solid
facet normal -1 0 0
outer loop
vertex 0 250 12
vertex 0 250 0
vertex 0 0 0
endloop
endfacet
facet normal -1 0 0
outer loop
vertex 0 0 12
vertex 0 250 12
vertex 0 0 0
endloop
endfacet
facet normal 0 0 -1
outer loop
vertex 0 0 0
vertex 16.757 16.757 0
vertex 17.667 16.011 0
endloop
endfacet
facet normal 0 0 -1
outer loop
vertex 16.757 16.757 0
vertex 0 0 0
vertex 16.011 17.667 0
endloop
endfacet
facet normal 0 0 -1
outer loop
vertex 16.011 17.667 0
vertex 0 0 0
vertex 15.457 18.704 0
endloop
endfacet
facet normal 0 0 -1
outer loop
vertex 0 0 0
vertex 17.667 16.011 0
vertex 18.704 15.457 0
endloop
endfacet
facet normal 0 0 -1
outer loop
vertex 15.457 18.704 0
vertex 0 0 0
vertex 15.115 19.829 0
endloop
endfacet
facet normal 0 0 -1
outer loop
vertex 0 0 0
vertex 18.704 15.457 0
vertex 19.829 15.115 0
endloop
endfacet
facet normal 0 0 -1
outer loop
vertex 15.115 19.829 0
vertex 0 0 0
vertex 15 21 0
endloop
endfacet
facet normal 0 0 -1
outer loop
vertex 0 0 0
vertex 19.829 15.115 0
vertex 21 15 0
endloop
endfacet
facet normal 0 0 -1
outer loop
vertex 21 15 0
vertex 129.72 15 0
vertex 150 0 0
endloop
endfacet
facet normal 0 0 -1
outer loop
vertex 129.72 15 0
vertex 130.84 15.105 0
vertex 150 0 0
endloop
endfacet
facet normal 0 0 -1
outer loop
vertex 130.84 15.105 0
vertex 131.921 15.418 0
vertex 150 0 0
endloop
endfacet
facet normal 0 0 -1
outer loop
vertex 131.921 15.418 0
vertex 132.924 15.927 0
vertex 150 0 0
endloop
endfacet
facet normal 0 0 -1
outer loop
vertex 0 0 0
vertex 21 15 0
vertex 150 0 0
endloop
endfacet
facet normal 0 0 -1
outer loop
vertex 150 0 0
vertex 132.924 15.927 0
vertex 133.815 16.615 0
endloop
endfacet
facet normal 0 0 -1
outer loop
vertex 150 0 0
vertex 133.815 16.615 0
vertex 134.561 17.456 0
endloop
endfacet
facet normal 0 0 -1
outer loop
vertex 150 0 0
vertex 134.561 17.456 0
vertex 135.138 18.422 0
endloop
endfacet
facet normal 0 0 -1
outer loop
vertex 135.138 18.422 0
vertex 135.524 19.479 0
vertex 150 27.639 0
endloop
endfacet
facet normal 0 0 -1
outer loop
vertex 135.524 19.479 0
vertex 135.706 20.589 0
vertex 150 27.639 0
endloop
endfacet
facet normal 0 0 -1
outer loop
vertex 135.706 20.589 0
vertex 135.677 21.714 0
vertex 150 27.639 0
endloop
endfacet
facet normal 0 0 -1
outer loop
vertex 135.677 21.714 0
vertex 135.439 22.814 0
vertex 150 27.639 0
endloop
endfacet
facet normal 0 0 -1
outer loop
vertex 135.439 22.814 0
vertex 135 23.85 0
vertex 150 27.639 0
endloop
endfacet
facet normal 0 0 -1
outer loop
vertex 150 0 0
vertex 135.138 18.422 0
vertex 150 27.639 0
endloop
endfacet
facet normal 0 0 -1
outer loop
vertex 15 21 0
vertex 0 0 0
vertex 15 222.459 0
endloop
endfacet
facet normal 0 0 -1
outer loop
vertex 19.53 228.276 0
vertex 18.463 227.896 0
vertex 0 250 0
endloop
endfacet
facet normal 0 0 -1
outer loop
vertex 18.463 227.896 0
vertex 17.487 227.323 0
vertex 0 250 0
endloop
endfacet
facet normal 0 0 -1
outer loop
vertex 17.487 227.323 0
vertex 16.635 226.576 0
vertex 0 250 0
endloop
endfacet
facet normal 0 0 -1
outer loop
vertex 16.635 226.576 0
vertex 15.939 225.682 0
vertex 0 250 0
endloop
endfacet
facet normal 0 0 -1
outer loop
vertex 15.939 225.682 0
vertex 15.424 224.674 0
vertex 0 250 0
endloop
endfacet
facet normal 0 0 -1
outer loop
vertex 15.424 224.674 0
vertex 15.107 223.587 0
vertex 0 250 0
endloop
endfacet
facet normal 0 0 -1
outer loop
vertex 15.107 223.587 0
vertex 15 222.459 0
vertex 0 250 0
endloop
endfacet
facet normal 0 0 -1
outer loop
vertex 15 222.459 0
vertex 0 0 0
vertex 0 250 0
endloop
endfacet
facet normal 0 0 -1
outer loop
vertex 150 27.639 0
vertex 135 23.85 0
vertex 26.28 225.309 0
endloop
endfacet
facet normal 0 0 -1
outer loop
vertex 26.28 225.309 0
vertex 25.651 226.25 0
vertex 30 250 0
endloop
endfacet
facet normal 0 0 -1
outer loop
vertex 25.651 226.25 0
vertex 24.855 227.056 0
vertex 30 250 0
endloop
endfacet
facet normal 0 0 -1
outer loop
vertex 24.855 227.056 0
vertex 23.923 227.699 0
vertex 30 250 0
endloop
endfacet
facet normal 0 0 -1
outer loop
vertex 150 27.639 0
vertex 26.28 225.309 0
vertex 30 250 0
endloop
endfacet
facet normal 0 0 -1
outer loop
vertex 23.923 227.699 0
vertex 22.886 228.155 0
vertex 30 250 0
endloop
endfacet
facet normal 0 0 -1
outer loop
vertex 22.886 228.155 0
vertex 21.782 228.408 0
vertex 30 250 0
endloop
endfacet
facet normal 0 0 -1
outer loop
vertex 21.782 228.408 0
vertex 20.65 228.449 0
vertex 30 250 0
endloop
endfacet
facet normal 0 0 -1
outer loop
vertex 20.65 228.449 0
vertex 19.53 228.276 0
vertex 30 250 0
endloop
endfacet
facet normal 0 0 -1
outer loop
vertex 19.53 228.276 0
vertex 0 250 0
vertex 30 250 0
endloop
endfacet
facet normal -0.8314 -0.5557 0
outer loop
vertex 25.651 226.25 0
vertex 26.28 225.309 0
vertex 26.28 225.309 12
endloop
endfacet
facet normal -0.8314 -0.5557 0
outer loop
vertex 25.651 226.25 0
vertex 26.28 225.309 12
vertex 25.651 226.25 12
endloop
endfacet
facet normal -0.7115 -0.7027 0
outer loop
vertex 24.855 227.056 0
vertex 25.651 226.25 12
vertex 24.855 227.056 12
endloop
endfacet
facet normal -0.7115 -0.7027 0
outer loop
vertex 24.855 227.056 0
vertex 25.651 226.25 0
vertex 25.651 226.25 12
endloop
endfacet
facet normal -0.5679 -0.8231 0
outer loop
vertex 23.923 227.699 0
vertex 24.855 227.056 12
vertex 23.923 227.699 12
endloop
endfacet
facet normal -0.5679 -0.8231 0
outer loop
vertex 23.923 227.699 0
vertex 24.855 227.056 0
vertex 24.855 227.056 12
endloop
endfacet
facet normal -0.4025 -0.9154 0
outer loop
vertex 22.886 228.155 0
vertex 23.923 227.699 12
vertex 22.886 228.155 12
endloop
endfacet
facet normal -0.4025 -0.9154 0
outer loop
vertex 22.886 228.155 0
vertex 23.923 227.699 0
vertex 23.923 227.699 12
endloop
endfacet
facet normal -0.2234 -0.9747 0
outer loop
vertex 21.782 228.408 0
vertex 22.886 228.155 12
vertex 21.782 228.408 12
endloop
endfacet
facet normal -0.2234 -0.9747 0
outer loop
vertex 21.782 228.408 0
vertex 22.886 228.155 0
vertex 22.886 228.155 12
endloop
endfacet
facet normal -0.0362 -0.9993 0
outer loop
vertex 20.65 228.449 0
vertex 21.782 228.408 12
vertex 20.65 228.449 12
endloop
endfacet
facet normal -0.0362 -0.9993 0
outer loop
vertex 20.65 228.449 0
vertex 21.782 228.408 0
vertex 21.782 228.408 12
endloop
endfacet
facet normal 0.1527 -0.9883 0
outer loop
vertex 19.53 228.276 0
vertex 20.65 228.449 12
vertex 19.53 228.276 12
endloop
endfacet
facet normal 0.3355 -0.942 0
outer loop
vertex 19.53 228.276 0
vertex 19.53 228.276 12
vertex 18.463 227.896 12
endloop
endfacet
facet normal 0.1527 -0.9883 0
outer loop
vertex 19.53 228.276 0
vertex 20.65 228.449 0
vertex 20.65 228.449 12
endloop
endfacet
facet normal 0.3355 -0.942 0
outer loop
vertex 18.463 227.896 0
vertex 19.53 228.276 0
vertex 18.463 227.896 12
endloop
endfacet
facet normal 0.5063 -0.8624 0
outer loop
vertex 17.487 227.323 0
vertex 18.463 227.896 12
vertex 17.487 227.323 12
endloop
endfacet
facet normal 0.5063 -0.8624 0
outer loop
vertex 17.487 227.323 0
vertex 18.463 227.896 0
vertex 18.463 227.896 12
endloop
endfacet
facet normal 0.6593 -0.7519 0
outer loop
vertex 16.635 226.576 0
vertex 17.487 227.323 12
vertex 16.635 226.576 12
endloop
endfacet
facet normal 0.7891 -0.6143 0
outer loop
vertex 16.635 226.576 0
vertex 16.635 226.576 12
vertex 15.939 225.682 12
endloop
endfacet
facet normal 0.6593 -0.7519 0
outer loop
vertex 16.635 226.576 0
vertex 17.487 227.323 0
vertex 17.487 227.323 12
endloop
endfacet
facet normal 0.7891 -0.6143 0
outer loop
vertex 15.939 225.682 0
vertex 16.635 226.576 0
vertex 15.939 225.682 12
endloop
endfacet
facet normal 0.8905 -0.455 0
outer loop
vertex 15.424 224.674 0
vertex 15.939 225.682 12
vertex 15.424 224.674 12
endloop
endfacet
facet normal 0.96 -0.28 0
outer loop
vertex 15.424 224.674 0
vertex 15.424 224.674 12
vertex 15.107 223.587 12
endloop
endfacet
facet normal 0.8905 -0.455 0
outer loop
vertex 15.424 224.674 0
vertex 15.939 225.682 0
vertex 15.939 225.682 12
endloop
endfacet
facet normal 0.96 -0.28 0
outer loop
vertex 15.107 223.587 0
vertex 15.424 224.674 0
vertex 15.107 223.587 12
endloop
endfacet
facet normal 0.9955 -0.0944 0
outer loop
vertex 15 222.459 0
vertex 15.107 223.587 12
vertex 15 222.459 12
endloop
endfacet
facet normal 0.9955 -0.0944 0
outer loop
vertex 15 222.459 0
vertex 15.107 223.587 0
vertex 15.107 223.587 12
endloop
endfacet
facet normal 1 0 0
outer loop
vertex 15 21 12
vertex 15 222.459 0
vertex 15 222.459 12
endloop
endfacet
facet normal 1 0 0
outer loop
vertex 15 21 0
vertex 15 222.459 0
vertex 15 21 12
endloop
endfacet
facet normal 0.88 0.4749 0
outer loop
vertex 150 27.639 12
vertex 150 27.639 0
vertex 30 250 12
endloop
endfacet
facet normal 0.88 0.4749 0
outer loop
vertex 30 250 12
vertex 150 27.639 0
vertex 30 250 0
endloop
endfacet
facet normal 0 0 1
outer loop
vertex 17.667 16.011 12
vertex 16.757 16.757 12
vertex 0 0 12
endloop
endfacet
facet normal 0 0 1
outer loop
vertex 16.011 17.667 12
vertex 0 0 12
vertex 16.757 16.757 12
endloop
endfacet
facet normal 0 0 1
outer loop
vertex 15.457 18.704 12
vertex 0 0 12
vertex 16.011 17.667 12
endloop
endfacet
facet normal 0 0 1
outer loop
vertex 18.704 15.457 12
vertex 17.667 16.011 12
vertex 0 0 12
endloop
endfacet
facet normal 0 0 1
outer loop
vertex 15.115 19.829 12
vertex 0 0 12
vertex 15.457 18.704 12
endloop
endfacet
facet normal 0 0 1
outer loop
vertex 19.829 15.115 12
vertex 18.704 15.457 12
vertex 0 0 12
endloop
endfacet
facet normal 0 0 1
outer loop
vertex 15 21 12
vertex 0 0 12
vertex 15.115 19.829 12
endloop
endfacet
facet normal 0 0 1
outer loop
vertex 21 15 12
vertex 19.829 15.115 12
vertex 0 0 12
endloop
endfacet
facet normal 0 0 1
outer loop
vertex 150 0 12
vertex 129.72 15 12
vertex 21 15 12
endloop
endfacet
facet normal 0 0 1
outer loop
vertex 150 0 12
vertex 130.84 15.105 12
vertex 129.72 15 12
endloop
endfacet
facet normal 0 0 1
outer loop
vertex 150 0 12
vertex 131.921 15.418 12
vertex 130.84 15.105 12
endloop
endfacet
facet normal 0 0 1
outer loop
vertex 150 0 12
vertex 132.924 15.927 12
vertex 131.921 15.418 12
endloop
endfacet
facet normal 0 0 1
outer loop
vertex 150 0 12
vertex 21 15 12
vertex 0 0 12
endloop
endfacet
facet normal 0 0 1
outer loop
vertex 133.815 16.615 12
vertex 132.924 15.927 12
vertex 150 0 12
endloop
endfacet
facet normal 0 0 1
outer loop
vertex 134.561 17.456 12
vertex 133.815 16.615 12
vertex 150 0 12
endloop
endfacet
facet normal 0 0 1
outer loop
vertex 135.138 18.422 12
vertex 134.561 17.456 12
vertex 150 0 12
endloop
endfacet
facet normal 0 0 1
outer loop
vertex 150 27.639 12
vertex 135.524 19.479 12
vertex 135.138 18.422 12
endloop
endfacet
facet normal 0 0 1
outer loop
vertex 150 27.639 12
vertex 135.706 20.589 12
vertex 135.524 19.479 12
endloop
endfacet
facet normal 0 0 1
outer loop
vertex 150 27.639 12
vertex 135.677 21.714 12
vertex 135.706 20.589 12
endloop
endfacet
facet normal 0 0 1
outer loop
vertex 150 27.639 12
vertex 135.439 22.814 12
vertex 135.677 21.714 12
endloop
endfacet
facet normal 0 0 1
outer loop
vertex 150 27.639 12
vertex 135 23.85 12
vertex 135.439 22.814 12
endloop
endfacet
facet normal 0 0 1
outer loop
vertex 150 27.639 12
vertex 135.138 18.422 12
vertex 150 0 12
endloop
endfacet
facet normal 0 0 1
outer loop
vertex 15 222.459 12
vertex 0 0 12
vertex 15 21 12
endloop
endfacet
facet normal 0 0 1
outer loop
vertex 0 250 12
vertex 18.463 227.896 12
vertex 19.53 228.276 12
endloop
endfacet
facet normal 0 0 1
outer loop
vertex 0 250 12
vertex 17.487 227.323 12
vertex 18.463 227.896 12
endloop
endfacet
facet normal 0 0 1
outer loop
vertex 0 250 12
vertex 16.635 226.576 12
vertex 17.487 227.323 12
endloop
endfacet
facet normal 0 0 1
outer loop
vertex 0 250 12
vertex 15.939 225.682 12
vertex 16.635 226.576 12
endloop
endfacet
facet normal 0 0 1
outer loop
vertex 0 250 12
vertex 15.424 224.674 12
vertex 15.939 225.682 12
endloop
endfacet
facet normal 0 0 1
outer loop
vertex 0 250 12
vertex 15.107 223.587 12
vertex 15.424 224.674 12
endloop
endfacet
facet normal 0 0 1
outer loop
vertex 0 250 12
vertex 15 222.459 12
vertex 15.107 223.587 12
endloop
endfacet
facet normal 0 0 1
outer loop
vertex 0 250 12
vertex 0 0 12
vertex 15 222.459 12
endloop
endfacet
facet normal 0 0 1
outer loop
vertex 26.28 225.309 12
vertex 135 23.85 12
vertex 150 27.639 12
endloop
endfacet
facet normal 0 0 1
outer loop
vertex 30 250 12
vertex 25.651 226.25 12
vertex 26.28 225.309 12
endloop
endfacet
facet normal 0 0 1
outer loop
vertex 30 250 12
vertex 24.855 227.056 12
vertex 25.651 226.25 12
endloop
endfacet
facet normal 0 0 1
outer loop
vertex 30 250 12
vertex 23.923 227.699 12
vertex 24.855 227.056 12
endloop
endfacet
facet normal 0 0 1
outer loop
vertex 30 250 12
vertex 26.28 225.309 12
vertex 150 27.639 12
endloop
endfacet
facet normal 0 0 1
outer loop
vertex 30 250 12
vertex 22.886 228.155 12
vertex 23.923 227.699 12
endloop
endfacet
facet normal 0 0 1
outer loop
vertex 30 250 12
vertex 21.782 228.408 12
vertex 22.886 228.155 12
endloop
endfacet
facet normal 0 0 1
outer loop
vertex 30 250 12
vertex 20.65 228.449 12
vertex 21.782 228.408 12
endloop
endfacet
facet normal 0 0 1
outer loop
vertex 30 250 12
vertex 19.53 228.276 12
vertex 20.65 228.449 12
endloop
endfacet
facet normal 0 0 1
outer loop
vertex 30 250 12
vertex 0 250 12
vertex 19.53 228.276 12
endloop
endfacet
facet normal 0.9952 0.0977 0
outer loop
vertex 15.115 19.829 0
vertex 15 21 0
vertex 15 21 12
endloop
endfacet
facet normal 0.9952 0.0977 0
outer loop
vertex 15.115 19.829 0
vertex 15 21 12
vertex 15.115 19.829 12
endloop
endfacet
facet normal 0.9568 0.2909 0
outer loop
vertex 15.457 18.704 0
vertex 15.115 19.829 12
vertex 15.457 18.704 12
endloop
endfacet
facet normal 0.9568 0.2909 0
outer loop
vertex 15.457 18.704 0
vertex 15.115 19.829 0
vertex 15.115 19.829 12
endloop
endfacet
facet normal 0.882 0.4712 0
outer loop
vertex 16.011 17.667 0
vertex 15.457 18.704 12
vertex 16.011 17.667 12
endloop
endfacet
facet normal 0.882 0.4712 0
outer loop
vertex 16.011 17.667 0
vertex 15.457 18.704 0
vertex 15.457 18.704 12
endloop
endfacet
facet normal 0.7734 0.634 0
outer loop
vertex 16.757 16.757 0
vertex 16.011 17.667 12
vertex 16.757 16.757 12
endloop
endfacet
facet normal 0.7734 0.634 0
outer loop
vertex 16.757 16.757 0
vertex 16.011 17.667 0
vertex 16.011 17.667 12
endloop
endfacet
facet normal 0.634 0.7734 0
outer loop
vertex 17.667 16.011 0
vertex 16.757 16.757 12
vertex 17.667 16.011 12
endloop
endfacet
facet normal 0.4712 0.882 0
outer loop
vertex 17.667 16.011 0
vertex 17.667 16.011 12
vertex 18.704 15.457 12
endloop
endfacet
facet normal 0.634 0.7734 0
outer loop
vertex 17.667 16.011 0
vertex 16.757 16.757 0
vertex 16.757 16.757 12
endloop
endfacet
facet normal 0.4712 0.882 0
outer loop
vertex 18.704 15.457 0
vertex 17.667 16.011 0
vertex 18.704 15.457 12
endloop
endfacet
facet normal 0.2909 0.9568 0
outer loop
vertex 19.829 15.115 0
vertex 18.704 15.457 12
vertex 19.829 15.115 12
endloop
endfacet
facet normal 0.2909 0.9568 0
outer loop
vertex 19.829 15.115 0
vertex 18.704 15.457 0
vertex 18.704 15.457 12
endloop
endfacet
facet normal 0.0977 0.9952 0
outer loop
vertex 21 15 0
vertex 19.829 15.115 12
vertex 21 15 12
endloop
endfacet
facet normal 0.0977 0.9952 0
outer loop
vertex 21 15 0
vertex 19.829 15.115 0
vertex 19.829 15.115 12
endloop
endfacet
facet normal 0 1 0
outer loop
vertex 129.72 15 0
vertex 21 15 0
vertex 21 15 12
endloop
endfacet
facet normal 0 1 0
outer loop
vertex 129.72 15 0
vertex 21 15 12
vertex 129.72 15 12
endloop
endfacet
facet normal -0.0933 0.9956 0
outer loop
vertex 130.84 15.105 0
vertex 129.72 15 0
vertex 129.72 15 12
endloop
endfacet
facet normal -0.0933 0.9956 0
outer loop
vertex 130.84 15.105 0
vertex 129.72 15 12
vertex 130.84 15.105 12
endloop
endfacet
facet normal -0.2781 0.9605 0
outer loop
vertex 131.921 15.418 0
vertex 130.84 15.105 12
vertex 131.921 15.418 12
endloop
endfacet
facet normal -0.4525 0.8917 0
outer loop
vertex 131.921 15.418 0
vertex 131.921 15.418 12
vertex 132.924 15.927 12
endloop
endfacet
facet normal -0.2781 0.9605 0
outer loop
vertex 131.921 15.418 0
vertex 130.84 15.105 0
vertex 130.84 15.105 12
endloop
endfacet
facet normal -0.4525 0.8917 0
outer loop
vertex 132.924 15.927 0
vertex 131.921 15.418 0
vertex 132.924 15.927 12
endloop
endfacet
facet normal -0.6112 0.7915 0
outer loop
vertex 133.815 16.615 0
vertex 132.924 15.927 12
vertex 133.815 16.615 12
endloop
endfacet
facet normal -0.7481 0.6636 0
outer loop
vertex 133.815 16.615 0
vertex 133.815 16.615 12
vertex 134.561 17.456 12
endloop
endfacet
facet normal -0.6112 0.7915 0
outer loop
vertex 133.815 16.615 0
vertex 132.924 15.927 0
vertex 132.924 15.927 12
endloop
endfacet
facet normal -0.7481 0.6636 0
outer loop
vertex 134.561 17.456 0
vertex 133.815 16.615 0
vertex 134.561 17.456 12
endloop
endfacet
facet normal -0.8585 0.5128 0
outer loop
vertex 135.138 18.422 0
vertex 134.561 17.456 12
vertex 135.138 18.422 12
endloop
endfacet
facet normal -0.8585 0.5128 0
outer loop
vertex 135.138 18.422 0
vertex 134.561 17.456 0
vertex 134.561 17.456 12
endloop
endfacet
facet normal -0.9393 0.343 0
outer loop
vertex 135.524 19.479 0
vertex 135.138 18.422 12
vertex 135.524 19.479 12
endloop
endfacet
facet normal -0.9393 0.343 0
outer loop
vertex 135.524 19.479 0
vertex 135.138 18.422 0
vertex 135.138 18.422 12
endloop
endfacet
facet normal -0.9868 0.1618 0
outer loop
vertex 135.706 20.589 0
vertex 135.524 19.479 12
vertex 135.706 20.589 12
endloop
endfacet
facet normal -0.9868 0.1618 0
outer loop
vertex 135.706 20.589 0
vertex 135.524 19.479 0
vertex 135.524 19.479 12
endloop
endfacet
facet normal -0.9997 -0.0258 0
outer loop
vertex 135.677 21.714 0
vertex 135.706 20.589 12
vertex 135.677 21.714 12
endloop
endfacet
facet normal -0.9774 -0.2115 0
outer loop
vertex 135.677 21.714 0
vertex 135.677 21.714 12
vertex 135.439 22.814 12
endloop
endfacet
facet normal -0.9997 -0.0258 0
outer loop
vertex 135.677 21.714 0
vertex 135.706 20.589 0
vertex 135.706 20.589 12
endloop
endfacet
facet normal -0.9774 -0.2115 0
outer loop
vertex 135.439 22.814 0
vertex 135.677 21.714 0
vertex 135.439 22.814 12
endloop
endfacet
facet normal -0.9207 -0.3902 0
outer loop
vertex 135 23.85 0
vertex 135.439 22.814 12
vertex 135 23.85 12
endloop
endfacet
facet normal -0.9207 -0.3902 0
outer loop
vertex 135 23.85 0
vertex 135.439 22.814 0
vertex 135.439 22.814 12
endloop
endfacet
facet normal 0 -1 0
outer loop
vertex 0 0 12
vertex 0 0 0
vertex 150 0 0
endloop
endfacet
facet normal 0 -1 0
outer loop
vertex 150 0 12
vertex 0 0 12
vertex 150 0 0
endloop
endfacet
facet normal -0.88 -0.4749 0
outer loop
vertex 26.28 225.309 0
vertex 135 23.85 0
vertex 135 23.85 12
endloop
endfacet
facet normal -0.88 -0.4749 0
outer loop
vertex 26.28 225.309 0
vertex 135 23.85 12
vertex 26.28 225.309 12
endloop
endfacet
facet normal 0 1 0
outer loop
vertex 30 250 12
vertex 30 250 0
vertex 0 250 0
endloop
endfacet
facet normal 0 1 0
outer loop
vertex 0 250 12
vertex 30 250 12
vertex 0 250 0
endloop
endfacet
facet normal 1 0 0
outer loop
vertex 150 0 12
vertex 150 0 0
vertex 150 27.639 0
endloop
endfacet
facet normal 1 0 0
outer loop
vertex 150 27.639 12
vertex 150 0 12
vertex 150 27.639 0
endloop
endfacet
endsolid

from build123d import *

# Parameters (mm, degrees)
BOSS_EXTRUDE2_DEPTH = 12


with BuildPart() as part:
    # Sketch1 → Boss-Extrude2 (new body)
    with BuildSketch(Plane.XY):
        Polygon((0, 250), (0, 0), (150, 0), (150, 27.638698422), (30, 250), align=None)
        with BuildLine():
            Line((21, 15), (129.719822185, 15))
            ThreePointArc((129.719822185, 15), (134.872349516, 17.925676968), (135, 23.849512632))
            Line((135, 23.849512632), (26.280177815, 225.308522369))
            ThreePointArc((26.280177815, 225.308522369), (19.530487647, 228.276271415), (15, 222.459009736))
            Line((15, 222.459009736), (15, 21))
            ThreePointArc((15, 21), (16.757359313, 16.757359313), (21, 15))
        make_face(mode=Mode.SUBTRACT)
    extrude(amount=BOSS_EXTRUDE2_DEPTH)


solid = part.part
